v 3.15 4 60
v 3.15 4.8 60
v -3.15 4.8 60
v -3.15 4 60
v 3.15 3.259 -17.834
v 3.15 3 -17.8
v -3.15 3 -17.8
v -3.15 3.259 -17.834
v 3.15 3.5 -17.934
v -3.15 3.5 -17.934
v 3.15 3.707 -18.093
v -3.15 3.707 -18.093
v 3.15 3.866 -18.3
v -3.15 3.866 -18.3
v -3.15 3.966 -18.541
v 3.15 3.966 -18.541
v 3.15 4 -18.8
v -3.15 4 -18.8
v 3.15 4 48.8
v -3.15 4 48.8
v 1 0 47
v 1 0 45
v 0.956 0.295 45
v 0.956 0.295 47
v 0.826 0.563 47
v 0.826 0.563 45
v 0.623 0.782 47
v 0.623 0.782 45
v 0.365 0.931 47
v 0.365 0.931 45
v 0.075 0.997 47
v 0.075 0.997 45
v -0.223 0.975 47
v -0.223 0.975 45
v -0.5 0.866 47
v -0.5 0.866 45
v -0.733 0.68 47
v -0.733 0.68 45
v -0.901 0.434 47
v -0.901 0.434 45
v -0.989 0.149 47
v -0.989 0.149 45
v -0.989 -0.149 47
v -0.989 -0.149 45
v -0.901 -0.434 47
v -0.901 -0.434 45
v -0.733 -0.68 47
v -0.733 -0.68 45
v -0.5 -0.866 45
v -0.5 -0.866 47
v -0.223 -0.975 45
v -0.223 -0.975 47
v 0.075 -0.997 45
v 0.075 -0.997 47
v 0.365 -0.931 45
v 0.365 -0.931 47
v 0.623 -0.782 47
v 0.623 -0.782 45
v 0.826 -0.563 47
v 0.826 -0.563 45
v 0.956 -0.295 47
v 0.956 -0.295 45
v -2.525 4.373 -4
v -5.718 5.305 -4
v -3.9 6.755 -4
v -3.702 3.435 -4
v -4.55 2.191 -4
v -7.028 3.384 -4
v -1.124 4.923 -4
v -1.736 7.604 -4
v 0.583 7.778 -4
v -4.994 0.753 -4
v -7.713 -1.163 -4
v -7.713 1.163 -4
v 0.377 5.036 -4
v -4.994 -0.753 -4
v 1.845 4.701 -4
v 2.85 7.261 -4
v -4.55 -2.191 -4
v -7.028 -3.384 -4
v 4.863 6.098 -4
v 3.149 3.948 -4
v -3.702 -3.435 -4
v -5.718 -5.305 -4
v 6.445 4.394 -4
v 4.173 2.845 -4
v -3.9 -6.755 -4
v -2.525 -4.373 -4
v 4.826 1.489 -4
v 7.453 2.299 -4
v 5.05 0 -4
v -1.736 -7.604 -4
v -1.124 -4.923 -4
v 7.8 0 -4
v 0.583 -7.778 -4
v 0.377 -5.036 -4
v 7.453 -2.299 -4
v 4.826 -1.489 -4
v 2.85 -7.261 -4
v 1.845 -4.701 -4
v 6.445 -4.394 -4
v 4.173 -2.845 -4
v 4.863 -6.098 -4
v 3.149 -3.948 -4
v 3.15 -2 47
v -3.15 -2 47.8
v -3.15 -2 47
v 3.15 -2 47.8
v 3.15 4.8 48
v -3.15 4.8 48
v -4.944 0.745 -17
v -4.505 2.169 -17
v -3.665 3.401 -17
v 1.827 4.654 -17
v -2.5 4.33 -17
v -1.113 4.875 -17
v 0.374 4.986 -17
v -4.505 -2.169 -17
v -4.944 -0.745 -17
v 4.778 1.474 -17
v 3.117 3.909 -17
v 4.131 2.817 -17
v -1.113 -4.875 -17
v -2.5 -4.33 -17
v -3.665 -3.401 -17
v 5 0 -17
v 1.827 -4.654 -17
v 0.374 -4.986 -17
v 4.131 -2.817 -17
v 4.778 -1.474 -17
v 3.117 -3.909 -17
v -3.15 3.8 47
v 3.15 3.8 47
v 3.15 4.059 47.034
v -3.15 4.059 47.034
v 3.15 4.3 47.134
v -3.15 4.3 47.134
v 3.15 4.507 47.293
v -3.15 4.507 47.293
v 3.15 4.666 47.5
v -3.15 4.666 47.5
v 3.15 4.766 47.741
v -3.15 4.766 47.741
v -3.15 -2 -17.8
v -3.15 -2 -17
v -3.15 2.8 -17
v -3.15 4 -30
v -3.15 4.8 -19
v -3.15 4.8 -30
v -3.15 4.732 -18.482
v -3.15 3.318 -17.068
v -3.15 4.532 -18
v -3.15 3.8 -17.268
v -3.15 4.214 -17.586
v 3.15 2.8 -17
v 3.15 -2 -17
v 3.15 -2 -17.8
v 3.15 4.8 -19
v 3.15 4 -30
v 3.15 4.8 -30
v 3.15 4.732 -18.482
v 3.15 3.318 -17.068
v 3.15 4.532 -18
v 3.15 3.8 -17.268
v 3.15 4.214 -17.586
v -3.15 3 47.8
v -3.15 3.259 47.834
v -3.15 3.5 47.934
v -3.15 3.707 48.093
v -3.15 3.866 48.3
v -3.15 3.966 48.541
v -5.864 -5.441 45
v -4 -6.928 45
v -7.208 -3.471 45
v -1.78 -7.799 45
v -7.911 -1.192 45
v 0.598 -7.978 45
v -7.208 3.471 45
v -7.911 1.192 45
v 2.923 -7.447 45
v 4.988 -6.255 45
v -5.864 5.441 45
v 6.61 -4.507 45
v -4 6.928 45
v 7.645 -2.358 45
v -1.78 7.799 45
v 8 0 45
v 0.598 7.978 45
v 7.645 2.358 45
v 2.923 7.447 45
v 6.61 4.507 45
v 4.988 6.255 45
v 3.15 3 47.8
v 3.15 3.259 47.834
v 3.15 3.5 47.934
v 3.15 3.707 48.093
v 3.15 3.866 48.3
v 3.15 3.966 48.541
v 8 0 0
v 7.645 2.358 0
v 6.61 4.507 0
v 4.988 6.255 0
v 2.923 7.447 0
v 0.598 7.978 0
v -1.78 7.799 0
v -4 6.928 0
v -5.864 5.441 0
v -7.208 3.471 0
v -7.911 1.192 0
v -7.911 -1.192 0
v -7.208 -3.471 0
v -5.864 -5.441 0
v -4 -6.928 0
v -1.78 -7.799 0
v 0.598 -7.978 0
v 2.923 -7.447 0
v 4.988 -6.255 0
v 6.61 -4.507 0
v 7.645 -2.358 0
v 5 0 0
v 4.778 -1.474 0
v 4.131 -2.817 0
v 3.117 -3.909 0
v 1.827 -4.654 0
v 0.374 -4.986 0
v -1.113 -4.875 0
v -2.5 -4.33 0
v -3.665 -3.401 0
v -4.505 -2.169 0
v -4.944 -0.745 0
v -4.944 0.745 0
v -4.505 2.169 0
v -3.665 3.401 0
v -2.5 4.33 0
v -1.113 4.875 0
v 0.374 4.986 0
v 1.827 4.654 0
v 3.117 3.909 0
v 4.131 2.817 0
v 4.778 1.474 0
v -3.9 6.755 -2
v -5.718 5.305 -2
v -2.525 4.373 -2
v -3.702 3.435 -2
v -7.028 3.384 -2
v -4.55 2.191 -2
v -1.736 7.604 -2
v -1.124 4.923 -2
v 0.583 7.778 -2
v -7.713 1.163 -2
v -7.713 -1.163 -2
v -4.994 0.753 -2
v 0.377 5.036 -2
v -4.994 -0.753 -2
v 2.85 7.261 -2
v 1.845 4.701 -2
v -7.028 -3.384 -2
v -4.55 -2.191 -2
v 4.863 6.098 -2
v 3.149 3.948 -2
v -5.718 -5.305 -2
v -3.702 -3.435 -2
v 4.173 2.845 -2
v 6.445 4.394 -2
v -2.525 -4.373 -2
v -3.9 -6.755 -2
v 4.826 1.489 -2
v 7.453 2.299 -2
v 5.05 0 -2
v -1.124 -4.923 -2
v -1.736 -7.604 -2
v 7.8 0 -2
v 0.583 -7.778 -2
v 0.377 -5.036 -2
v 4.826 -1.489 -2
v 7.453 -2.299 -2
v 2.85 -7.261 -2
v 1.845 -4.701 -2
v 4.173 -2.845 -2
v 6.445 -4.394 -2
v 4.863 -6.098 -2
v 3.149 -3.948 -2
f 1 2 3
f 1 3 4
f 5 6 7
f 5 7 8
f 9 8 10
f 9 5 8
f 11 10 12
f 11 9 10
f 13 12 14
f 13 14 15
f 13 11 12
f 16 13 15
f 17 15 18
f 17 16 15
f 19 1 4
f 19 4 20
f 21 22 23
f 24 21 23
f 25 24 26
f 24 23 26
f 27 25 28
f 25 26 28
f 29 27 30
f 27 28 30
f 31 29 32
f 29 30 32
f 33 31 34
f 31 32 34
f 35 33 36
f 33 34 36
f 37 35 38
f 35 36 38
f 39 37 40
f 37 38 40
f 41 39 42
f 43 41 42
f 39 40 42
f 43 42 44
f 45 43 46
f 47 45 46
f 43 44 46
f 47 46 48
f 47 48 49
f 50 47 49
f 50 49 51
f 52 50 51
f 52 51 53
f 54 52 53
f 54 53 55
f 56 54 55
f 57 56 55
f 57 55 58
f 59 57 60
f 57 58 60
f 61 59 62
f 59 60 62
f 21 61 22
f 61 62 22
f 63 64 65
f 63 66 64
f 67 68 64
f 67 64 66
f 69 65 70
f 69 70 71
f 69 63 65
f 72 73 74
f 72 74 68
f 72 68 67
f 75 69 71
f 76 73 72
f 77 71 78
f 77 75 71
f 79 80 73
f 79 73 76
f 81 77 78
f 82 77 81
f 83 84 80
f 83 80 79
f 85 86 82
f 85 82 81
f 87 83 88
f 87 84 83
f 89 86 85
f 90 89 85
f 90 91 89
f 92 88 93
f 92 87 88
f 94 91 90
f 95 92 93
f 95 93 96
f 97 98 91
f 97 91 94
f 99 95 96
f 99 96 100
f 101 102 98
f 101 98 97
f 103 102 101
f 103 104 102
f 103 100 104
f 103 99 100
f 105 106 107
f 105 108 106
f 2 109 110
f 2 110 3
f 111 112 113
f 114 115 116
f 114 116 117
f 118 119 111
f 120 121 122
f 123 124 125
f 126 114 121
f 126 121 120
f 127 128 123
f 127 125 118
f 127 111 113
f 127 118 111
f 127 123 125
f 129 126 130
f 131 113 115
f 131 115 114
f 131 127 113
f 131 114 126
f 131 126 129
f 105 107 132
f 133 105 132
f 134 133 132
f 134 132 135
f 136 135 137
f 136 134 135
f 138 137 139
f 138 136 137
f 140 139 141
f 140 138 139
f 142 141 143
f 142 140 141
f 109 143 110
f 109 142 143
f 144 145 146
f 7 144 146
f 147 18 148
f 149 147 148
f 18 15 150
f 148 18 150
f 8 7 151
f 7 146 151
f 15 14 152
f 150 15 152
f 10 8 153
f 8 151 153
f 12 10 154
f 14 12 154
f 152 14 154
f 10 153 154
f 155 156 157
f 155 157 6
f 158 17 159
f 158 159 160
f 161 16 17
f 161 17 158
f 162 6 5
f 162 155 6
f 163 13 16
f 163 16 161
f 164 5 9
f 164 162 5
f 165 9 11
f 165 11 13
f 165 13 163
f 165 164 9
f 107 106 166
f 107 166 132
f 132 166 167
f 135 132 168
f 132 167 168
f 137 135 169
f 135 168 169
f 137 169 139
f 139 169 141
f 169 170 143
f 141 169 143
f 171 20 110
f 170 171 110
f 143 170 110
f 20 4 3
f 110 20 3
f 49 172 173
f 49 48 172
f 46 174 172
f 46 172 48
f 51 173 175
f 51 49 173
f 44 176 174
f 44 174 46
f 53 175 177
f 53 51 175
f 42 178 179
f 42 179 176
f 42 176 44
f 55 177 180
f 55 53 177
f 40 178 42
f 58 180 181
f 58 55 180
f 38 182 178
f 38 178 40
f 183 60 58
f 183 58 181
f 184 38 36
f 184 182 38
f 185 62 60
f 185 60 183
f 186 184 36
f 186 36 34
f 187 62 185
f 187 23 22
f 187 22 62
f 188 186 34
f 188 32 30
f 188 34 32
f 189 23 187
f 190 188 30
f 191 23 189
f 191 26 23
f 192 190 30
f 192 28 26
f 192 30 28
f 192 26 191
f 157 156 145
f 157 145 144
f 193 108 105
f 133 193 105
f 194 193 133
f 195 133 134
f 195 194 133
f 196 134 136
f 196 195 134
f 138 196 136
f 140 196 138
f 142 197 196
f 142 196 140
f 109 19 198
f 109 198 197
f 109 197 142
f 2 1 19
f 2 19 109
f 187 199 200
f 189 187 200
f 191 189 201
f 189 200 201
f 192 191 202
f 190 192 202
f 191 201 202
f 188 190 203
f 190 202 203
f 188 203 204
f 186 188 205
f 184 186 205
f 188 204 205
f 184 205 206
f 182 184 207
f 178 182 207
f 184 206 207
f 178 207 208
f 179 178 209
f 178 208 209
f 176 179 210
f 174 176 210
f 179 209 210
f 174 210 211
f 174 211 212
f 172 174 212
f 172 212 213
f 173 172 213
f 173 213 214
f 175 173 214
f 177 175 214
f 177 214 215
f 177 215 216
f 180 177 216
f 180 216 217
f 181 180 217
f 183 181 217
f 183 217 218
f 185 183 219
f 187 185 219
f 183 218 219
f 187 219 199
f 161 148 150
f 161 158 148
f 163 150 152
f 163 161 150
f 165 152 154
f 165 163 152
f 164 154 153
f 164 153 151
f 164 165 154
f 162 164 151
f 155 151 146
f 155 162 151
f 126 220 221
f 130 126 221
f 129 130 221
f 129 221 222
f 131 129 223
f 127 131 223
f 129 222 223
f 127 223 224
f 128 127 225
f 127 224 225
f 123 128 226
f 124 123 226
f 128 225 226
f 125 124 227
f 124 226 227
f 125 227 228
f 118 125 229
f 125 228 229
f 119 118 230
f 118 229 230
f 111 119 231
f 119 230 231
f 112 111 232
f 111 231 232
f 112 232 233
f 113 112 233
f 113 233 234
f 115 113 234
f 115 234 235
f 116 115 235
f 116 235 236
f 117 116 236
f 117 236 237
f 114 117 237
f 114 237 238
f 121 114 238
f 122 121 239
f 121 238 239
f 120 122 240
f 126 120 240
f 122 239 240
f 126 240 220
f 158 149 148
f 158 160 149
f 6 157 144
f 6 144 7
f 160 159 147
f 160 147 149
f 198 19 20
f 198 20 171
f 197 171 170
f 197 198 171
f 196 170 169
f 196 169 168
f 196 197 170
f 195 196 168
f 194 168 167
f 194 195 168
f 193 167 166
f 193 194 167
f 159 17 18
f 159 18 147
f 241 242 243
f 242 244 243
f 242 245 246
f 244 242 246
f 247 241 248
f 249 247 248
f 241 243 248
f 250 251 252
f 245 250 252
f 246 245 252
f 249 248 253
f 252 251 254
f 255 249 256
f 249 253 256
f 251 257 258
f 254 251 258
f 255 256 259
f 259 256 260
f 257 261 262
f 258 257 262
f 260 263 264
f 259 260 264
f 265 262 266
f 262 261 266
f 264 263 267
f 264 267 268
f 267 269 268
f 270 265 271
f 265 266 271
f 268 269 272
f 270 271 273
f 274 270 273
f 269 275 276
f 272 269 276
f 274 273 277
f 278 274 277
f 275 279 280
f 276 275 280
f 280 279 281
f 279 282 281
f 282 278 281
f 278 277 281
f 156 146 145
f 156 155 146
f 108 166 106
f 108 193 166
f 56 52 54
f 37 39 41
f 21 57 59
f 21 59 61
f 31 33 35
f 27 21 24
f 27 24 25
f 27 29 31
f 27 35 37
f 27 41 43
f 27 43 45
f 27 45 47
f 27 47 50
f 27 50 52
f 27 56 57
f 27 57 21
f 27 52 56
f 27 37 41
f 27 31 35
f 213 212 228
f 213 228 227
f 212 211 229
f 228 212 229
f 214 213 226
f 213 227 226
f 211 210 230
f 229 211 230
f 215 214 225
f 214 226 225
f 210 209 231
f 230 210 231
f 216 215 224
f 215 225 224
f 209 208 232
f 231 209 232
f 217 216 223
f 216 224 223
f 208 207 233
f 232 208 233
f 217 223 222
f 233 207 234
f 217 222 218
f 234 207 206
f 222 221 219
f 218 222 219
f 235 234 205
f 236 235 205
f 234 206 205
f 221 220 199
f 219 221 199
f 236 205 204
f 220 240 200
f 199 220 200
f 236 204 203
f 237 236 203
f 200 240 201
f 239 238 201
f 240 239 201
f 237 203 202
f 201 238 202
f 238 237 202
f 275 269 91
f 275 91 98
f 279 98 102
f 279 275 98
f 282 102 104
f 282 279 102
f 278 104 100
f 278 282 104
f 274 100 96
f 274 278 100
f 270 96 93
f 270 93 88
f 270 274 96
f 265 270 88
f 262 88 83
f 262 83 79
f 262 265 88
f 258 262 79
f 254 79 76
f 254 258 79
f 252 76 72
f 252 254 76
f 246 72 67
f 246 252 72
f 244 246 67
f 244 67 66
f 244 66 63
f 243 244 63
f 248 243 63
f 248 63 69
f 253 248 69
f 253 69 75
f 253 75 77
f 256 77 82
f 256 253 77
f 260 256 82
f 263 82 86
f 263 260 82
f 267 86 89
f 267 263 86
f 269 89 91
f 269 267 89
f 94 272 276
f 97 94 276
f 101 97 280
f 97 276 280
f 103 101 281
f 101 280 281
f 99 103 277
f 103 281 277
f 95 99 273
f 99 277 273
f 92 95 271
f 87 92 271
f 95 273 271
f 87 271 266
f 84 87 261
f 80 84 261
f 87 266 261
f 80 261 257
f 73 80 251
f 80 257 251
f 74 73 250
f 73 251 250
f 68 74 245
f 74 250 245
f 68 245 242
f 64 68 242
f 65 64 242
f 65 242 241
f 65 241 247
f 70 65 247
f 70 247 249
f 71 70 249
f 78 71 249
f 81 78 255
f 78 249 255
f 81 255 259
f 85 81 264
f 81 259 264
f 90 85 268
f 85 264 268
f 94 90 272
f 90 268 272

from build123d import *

# Parameters (mm, degrees)
F0_R     = 8
F1_DEPTH = 45
F2_R     = 5
F3_DEPTH = 17
F5_START = 2
F4_R     = 7.8
F4_R_2   = 5.05
F5_DEPTH = 2
F6_R     = 1
F7_DEPTH = 2
F9_DEPTH = 3.15


with BuildPart() as f1:
    # F0 (on Top) → F1 (new body)
    with BuildSketch(Plane.XY):
        Circle(F0_R)
    extrude(amount=F1_DEPTH)

    # F2 (on face) → F3 (join)
    with BuildSketch(Plane(origin=(0, 0, 0), x_dir=(1, 0, 0), z_dir=(0, 0, -1))):
        Circle(F2_R)
    extrude(amount=F3_DEPTH)

    # F6 (on face) → F7 (join)
    with BuildSketch(Plane.XY.offset(45)):
        Circle(F6_R)
    extrude(amount=F7_DEPTH)


with BuildPart() as f5:
    # F4 (on face) → F5 (new body)
    with BuildSketch(Plane(origin=(0, 0, 0), x_dir=(1, 0, 0), z_dir=(0, 0, -1)).offset(F5_START)):
        Circle(F4_R)
        Circle(F4_R_2, mode=Mode.SUBTRACT)
    extrude(amount=F5_DEPTH)


with BuildPart() as f9:
    # F8 (on Right) → F9 (new body, symmetric)
    with BuildSketch(Plane.YZ):
        with BuildLine():
            Line((-2, 47), (0, 47))
            Line((0, 47), (3.8, 47))
            ThreePointArc((3.8, 47), (4.5071067812, 47.2928932188), (4.8, 48))
            Line((4.8, 48), (4.8, 60))
            Line((4.8, 60), (4, 60))
            Line((4, 60), (4, 48.8))
            ThreePointArc((4, 48.8), (3.7071067812, 48.0928932188), (3, 47.8))
            Line((3, 47.8), (-2, 47.8))
            Line((-2, 47.8), (-2, 47))
        make_face()
    extrude(amount=F9_DEPTH, both=True)


with BuildPart() as f9b:
    # F8 (on Right) → F9, piece 2 (new body, symmetric)
    with BuildSketch(Plane.YZ):
        with BuildLine():
            Line((2.8, -17), (-2, -17))
            Line((-2, -17), (-2, -17.8))
            Line((-2, -17.8), (3, -17.8))
            ThreePointArc((3, -17.8), (3.7071067812, -18.0928932188), (4, -18.8))
            Line((4, -18.8), (4, -30))
            Line((4, -30), (4.8, -30))
            Line((4.8, -30), (4.8, -19))
            ThreePointArc((4.8, -19), (4.2142135624, -17.5857864376), (2.8, -17))
        make_face()
    extrude(amount=F9_DEPTH, both=True)


solid = Compound([f1.part, f5.part, f9.part, f9b.part])
